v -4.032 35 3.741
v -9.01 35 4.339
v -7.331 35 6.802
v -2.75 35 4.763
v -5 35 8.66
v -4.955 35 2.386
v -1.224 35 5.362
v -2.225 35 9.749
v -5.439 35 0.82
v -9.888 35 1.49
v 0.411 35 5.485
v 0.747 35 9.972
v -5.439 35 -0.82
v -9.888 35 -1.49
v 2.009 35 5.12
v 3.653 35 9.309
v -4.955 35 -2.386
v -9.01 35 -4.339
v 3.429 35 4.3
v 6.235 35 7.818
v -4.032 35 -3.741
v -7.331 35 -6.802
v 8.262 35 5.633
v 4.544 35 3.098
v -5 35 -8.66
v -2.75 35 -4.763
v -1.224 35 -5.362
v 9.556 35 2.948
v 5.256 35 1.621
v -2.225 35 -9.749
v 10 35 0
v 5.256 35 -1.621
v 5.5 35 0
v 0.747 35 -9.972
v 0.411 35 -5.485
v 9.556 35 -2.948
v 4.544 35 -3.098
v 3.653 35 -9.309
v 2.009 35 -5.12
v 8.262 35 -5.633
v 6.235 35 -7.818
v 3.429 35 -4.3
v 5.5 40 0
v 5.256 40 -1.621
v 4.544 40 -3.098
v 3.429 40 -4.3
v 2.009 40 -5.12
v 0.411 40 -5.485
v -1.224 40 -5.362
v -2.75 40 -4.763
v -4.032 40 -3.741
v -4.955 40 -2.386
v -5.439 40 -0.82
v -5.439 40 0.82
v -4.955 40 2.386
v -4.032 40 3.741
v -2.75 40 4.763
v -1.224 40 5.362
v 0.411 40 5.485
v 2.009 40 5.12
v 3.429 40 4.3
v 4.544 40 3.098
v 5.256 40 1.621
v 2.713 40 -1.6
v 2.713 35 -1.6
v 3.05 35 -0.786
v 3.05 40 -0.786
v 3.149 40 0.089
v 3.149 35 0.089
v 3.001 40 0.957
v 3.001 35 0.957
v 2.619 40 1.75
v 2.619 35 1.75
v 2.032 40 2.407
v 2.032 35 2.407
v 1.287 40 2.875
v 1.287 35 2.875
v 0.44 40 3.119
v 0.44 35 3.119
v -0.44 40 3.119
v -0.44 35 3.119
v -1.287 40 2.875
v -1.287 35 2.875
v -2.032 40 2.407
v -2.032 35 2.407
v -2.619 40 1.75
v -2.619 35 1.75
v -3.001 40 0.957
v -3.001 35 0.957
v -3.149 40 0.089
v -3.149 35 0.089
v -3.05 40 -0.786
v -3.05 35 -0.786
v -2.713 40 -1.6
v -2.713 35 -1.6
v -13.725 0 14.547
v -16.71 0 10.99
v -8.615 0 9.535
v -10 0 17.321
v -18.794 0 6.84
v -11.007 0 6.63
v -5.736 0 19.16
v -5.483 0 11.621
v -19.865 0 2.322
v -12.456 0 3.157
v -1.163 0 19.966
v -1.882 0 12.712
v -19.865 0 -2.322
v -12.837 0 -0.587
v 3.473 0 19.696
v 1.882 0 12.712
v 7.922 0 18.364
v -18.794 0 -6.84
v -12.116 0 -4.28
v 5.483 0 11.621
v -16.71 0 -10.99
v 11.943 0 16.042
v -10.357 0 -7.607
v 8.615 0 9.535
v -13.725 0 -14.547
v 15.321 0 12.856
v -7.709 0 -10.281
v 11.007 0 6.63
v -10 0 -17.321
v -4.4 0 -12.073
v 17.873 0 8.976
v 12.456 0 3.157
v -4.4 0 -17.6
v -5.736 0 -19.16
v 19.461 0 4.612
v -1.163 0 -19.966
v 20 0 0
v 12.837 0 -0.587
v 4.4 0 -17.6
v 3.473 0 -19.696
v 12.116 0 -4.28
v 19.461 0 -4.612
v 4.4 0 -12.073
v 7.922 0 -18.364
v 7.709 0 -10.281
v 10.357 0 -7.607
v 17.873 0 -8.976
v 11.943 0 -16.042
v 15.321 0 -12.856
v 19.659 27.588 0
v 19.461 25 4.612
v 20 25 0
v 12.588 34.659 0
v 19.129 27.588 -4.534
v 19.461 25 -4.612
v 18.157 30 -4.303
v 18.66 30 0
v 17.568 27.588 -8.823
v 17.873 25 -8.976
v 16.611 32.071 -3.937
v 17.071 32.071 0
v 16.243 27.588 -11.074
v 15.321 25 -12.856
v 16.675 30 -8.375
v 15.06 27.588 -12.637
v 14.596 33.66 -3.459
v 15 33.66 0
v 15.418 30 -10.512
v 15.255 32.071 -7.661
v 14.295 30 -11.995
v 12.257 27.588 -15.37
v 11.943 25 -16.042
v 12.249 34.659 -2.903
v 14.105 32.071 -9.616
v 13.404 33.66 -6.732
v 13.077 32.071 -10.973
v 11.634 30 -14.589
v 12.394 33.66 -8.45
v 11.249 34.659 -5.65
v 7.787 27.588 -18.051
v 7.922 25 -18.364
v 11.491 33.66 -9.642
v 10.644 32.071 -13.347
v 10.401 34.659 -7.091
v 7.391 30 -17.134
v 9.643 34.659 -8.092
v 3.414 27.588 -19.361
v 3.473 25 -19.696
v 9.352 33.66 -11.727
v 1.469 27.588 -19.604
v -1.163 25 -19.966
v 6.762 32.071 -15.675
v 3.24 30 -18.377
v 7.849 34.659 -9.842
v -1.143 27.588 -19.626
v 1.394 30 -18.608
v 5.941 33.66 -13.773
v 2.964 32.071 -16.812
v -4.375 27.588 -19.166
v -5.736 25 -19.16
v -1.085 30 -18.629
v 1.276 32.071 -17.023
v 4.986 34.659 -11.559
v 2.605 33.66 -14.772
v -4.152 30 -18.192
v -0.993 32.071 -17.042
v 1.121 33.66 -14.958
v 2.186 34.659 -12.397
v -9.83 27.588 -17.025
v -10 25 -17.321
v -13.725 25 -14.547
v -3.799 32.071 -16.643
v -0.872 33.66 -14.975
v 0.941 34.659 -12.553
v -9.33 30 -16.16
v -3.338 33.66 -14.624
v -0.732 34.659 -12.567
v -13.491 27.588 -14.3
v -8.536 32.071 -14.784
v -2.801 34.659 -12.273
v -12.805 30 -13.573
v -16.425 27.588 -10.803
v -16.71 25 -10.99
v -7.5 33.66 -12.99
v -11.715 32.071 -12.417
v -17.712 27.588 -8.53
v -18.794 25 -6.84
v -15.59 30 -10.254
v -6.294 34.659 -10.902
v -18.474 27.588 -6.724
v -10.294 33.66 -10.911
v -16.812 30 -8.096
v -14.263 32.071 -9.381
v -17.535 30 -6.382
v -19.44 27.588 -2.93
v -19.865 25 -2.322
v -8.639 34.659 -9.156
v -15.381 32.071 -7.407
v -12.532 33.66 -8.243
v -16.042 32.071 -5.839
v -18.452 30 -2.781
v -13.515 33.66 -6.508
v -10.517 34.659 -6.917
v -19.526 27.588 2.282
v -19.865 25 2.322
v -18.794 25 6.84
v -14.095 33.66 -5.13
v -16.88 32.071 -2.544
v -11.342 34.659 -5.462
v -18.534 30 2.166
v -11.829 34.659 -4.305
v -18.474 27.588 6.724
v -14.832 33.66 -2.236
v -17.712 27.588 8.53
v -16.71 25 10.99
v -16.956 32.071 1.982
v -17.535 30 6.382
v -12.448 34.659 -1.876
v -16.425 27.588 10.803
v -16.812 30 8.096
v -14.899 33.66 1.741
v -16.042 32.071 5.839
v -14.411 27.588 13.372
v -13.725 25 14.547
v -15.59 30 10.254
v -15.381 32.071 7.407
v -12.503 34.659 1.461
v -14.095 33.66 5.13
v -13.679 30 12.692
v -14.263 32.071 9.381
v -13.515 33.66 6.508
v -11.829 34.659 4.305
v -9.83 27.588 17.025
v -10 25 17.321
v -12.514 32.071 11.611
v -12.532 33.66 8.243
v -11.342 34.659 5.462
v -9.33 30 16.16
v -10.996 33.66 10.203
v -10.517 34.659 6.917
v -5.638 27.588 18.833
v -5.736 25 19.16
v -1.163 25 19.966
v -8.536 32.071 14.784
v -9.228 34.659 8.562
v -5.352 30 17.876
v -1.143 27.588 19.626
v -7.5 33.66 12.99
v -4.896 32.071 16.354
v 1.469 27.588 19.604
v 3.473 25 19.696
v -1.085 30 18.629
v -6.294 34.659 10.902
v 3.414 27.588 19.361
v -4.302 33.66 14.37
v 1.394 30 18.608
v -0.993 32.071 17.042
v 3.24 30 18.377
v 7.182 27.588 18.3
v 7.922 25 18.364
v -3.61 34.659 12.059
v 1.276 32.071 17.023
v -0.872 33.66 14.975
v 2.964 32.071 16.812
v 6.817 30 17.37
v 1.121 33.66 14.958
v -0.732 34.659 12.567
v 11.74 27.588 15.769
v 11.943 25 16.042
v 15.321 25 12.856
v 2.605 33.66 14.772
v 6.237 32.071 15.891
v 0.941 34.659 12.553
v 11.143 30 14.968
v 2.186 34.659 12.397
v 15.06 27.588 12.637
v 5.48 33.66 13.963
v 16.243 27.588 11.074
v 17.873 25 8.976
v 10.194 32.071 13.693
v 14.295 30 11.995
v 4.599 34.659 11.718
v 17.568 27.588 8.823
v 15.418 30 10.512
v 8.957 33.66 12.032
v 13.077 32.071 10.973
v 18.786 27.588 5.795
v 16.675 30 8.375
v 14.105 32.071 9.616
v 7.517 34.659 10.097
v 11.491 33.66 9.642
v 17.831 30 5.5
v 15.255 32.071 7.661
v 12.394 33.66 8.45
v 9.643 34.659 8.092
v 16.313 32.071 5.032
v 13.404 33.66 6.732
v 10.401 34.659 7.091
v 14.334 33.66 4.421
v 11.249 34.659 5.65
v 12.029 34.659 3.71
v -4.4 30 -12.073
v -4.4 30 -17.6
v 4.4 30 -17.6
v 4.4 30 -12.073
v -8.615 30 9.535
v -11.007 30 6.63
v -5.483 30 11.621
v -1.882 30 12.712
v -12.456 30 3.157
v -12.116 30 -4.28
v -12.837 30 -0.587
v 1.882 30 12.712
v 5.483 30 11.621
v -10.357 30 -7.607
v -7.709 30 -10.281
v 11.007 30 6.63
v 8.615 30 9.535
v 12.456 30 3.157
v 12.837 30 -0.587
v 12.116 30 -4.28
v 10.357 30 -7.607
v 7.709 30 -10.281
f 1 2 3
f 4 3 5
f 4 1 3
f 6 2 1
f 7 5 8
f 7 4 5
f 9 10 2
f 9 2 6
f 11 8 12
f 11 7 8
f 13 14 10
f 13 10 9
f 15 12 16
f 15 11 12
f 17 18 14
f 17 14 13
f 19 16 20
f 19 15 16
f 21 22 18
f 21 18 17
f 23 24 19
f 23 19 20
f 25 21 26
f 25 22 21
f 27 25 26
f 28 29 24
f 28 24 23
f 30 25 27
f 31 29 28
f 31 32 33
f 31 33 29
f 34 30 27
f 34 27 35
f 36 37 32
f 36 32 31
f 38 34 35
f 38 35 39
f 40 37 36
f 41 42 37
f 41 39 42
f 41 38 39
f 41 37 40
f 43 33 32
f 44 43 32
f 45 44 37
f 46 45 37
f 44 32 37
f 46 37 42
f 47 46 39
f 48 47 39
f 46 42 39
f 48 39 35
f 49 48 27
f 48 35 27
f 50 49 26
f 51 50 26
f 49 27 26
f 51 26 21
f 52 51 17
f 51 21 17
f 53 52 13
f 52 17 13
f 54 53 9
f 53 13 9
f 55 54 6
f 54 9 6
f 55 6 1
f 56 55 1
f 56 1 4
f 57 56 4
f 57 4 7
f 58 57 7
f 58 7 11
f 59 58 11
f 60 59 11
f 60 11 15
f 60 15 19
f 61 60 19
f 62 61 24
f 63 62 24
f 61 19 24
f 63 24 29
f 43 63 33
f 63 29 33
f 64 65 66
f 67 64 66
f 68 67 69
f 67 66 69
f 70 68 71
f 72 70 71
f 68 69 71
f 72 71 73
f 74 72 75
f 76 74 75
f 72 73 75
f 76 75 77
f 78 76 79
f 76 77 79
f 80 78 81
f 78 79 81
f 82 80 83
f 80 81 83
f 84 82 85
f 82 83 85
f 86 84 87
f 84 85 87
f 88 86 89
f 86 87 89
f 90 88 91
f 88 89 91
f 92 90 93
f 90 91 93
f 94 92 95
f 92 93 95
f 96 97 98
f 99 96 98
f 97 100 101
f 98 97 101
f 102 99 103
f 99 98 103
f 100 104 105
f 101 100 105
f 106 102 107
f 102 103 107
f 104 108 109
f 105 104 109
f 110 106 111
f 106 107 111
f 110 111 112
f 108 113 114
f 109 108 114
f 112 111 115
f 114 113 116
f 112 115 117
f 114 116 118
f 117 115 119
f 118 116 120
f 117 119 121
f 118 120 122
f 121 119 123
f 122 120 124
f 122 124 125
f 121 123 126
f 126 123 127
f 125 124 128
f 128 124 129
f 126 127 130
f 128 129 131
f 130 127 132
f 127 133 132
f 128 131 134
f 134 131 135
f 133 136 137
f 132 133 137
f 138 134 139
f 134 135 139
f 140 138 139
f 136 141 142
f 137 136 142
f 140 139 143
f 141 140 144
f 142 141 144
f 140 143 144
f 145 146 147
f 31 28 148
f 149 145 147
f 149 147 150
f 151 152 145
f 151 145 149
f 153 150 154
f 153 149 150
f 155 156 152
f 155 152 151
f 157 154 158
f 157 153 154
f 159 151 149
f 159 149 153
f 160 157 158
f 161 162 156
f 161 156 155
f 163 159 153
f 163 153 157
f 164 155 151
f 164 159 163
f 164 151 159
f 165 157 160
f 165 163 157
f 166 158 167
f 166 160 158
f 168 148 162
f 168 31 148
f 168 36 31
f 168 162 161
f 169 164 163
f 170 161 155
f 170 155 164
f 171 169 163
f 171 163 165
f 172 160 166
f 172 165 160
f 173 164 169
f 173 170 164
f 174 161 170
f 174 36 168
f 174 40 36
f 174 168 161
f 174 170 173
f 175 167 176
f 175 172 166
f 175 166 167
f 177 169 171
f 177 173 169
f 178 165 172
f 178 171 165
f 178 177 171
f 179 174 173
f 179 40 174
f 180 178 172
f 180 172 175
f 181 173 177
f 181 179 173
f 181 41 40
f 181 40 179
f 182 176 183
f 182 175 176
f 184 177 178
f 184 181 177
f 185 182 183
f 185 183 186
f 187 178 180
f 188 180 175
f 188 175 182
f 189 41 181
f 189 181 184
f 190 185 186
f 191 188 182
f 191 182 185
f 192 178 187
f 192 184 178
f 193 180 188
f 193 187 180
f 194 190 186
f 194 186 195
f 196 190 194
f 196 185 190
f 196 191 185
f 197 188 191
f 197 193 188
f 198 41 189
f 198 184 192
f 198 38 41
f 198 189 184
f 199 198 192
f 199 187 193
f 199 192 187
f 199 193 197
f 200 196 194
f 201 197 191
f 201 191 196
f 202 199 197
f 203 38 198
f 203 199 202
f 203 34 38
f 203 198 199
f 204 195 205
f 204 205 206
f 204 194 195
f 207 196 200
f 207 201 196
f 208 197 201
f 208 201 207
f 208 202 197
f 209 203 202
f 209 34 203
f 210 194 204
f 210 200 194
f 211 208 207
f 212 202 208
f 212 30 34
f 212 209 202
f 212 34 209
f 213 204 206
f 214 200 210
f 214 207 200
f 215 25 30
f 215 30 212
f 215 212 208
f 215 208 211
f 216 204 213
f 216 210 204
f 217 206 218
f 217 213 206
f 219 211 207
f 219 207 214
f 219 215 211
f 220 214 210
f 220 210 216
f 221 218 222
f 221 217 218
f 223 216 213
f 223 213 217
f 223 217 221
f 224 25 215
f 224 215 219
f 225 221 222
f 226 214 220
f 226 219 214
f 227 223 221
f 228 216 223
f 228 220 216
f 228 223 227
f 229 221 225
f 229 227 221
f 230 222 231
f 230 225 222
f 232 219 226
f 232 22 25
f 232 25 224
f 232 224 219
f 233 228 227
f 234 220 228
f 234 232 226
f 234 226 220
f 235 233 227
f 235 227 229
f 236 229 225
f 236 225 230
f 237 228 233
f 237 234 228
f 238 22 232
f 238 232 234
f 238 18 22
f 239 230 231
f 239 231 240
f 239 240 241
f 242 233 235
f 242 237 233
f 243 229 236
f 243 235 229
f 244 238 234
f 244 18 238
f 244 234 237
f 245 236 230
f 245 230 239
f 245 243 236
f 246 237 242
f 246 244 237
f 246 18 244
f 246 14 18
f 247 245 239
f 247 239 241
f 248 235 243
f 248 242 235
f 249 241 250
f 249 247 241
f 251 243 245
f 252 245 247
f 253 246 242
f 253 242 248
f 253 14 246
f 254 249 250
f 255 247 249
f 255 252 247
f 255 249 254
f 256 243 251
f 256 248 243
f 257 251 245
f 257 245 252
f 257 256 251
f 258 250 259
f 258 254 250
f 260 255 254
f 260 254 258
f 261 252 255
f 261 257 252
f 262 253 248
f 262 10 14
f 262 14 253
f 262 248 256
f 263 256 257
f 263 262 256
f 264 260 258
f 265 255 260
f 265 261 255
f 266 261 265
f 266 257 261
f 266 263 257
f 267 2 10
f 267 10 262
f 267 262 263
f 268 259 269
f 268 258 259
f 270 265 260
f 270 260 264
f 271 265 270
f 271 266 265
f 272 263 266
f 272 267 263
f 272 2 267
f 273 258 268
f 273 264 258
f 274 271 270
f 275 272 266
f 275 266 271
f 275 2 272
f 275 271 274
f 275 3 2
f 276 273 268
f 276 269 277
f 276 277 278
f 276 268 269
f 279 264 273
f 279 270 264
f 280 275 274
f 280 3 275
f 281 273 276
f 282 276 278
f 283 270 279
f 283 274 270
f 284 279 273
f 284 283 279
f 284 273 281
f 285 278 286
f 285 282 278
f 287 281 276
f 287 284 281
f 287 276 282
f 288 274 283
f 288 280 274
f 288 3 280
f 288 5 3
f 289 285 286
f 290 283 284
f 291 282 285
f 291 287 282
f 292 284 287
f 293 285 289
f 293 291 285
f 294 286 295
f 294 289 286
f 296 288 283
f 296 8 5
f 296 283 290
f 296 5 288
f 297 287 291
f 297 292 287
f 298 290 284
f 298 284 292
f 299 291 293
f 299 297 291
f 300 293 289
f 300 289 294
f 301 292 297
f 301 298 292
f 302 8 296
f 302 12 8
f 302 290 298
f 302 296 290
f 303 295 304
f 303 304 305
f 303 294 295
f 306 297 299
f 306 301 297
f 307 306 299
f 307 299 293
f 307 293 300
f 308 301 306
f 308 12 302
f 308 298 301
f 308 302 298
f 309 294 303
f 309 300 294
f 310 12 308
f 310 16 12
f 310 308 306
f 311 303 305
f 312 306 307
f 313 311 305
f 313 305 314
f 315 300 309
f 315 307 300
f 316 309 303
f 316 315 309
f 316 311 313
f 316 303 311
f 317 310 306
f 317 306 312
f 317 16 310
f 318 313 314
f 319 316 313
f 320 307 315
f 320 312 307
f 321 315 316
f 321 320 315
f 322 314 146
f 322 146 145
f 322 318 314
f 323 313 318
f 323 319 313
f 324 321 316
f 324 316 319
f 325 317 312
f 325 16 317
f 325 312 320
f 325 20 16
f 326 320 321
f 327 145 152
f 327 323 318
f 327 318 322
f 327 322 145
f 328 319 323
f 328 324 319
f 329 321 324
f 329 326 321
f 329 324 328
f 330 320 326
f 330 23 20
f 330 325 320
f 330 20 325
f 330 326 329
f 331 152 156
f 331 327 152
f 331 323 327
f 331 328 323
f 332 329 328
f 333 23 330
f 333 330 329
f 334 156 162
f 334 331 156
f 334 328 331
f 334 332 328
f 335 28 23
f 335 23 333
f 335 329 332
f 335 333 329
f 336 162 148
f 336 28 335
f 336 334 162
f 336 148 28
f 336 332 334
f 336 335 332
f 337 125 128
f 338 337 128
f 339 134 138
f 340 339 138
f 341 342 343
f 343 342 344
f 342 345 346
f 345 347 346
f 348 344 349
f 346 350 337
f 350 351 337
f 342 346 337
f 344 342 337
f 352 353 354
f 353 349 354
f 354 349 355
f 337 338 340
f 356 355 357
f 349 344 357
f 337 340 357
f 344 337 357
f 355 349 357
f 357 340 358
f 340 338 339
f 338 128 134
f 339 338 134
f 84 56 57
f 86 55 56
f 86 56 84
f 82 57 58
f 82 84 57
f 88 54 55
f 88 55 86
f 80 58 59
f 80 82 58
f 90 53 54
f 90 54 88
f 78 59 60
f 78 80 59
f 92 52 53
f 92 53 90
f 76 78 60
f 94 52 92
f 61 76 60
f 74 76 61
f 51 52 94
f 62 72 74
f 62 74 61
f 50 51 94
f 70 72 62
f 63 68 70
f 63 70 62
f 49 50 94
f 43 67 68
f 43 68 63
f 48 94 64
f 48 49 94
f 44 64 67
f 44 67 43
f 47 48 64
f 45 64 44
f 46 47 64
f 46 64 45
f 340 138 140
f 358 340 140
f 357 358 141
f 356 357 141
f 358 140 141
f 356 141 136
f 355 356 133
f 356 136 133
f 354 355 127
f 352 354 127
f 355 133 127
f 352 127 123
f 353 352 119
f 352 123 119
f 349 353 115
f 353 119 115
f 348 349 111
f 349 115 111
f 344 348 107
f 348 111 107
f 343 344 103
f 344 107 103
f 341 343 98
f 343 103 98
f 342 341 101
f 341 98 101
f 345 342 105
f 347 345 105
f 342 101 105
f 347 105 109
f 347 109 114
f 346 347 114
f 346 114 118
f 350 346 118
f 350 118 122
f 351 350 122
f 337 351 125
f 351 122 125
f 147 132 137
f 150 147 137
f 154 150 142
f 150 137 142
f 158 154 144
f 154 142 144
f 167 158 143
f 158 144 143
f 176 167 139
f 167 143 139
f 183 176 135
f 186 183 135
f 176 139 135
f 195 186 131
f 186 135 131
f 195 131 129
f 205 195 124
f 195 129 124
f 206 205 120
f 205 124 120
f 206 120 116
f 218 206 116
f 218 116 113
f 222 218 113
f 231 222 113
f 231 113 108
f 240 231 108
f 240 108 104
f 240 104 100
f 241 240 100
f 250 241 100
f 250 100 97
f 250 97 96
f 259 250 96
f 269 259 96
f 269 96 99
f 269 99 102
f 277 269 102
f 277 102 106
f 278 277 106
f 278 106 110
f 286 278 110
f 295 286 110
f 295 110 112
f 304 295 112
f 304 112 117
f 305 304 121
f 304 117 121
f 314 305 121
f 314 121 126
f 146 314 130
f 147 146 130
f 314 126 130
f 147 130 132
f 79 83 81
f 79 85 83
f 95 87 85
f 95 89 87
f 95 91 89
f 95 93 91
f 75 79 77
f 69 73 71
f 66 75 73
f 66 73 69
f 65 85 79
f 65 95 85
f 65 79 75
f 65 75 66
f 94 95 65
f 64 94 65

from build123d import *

# Parameters (mm, degrees)
SKETCH1_R           = 20
BOSS_EXTRUDE1_DEPTH = 30
SKETCH2_R           = 20
BOSS_EXTRUDE2_DEPTH = 5
SKETCH3_R           = 5.5
BOSS_EXTRUDE3_DEPTH = 5
FILLET1_R           = 10


with BuildPart() as part:
    # Sketch1 → Boss-Extrude1 (new body)
    with BuildSketch(Plane(origin=(0, 0, 0), x_dir=(1, 0, 0), z_dir=(0, 1, 0))):
        Circle(SKETCH1_R)
        with BuildLine():
            Line((-4.4, 17.6), (4.4, 17.6))
            Line((4.4, 17.6), (4.4, 12.073214154))
            ThreePointArc((4.4, 12.073214154), (0, -12.85), (-4.4, 12.073214154))
            Line((-4.4, 12.073214154), (-4.4, 17.6))
        make_face(mode=Mode.SUBTRACT)
    extrude(amount=BOSS_EXTRUDE1_DEPTH)

    # Sketch2 → Boss-Extrude2 (add)
    with BuildSketch(Plane(origin=(0, 30, 0), x_dir=(1, 0, 0), z_dir=(0, 1, 0))):
        Circle(SKETCH2_R)
    extrude(amount=BOSS_EXTRUDE2_DEPTH)

    # Sketch3 → Boss-Extrude3 (add)
    with BuildSketch(Plane(origin=(0, 35, 0), x_dir=(1, 0, 0), z_dir=(0, 1, 0))):
        Circle(SKETCH3_R)
        with BuildLine():
            Line((-2.71339271, 1.6), (2.71339271, 1.6))
            ThreePointArc((2.71339271, 1.6), (0, -3.15), (-2.71339271, 1.6))
        make_face(mode=Mode.SUBTRACT)
    extrude(amount=BOSS_EXTRUDE3_DEPTH)

    # Fillet1
    fillet1_edges = [part.edges().sort_by_distance(p)[0] for p in [
        (-20, 35, 0),
    ]]
    fillet(fillet1_edges, radius=FILLET1_R)


solid = part.part
